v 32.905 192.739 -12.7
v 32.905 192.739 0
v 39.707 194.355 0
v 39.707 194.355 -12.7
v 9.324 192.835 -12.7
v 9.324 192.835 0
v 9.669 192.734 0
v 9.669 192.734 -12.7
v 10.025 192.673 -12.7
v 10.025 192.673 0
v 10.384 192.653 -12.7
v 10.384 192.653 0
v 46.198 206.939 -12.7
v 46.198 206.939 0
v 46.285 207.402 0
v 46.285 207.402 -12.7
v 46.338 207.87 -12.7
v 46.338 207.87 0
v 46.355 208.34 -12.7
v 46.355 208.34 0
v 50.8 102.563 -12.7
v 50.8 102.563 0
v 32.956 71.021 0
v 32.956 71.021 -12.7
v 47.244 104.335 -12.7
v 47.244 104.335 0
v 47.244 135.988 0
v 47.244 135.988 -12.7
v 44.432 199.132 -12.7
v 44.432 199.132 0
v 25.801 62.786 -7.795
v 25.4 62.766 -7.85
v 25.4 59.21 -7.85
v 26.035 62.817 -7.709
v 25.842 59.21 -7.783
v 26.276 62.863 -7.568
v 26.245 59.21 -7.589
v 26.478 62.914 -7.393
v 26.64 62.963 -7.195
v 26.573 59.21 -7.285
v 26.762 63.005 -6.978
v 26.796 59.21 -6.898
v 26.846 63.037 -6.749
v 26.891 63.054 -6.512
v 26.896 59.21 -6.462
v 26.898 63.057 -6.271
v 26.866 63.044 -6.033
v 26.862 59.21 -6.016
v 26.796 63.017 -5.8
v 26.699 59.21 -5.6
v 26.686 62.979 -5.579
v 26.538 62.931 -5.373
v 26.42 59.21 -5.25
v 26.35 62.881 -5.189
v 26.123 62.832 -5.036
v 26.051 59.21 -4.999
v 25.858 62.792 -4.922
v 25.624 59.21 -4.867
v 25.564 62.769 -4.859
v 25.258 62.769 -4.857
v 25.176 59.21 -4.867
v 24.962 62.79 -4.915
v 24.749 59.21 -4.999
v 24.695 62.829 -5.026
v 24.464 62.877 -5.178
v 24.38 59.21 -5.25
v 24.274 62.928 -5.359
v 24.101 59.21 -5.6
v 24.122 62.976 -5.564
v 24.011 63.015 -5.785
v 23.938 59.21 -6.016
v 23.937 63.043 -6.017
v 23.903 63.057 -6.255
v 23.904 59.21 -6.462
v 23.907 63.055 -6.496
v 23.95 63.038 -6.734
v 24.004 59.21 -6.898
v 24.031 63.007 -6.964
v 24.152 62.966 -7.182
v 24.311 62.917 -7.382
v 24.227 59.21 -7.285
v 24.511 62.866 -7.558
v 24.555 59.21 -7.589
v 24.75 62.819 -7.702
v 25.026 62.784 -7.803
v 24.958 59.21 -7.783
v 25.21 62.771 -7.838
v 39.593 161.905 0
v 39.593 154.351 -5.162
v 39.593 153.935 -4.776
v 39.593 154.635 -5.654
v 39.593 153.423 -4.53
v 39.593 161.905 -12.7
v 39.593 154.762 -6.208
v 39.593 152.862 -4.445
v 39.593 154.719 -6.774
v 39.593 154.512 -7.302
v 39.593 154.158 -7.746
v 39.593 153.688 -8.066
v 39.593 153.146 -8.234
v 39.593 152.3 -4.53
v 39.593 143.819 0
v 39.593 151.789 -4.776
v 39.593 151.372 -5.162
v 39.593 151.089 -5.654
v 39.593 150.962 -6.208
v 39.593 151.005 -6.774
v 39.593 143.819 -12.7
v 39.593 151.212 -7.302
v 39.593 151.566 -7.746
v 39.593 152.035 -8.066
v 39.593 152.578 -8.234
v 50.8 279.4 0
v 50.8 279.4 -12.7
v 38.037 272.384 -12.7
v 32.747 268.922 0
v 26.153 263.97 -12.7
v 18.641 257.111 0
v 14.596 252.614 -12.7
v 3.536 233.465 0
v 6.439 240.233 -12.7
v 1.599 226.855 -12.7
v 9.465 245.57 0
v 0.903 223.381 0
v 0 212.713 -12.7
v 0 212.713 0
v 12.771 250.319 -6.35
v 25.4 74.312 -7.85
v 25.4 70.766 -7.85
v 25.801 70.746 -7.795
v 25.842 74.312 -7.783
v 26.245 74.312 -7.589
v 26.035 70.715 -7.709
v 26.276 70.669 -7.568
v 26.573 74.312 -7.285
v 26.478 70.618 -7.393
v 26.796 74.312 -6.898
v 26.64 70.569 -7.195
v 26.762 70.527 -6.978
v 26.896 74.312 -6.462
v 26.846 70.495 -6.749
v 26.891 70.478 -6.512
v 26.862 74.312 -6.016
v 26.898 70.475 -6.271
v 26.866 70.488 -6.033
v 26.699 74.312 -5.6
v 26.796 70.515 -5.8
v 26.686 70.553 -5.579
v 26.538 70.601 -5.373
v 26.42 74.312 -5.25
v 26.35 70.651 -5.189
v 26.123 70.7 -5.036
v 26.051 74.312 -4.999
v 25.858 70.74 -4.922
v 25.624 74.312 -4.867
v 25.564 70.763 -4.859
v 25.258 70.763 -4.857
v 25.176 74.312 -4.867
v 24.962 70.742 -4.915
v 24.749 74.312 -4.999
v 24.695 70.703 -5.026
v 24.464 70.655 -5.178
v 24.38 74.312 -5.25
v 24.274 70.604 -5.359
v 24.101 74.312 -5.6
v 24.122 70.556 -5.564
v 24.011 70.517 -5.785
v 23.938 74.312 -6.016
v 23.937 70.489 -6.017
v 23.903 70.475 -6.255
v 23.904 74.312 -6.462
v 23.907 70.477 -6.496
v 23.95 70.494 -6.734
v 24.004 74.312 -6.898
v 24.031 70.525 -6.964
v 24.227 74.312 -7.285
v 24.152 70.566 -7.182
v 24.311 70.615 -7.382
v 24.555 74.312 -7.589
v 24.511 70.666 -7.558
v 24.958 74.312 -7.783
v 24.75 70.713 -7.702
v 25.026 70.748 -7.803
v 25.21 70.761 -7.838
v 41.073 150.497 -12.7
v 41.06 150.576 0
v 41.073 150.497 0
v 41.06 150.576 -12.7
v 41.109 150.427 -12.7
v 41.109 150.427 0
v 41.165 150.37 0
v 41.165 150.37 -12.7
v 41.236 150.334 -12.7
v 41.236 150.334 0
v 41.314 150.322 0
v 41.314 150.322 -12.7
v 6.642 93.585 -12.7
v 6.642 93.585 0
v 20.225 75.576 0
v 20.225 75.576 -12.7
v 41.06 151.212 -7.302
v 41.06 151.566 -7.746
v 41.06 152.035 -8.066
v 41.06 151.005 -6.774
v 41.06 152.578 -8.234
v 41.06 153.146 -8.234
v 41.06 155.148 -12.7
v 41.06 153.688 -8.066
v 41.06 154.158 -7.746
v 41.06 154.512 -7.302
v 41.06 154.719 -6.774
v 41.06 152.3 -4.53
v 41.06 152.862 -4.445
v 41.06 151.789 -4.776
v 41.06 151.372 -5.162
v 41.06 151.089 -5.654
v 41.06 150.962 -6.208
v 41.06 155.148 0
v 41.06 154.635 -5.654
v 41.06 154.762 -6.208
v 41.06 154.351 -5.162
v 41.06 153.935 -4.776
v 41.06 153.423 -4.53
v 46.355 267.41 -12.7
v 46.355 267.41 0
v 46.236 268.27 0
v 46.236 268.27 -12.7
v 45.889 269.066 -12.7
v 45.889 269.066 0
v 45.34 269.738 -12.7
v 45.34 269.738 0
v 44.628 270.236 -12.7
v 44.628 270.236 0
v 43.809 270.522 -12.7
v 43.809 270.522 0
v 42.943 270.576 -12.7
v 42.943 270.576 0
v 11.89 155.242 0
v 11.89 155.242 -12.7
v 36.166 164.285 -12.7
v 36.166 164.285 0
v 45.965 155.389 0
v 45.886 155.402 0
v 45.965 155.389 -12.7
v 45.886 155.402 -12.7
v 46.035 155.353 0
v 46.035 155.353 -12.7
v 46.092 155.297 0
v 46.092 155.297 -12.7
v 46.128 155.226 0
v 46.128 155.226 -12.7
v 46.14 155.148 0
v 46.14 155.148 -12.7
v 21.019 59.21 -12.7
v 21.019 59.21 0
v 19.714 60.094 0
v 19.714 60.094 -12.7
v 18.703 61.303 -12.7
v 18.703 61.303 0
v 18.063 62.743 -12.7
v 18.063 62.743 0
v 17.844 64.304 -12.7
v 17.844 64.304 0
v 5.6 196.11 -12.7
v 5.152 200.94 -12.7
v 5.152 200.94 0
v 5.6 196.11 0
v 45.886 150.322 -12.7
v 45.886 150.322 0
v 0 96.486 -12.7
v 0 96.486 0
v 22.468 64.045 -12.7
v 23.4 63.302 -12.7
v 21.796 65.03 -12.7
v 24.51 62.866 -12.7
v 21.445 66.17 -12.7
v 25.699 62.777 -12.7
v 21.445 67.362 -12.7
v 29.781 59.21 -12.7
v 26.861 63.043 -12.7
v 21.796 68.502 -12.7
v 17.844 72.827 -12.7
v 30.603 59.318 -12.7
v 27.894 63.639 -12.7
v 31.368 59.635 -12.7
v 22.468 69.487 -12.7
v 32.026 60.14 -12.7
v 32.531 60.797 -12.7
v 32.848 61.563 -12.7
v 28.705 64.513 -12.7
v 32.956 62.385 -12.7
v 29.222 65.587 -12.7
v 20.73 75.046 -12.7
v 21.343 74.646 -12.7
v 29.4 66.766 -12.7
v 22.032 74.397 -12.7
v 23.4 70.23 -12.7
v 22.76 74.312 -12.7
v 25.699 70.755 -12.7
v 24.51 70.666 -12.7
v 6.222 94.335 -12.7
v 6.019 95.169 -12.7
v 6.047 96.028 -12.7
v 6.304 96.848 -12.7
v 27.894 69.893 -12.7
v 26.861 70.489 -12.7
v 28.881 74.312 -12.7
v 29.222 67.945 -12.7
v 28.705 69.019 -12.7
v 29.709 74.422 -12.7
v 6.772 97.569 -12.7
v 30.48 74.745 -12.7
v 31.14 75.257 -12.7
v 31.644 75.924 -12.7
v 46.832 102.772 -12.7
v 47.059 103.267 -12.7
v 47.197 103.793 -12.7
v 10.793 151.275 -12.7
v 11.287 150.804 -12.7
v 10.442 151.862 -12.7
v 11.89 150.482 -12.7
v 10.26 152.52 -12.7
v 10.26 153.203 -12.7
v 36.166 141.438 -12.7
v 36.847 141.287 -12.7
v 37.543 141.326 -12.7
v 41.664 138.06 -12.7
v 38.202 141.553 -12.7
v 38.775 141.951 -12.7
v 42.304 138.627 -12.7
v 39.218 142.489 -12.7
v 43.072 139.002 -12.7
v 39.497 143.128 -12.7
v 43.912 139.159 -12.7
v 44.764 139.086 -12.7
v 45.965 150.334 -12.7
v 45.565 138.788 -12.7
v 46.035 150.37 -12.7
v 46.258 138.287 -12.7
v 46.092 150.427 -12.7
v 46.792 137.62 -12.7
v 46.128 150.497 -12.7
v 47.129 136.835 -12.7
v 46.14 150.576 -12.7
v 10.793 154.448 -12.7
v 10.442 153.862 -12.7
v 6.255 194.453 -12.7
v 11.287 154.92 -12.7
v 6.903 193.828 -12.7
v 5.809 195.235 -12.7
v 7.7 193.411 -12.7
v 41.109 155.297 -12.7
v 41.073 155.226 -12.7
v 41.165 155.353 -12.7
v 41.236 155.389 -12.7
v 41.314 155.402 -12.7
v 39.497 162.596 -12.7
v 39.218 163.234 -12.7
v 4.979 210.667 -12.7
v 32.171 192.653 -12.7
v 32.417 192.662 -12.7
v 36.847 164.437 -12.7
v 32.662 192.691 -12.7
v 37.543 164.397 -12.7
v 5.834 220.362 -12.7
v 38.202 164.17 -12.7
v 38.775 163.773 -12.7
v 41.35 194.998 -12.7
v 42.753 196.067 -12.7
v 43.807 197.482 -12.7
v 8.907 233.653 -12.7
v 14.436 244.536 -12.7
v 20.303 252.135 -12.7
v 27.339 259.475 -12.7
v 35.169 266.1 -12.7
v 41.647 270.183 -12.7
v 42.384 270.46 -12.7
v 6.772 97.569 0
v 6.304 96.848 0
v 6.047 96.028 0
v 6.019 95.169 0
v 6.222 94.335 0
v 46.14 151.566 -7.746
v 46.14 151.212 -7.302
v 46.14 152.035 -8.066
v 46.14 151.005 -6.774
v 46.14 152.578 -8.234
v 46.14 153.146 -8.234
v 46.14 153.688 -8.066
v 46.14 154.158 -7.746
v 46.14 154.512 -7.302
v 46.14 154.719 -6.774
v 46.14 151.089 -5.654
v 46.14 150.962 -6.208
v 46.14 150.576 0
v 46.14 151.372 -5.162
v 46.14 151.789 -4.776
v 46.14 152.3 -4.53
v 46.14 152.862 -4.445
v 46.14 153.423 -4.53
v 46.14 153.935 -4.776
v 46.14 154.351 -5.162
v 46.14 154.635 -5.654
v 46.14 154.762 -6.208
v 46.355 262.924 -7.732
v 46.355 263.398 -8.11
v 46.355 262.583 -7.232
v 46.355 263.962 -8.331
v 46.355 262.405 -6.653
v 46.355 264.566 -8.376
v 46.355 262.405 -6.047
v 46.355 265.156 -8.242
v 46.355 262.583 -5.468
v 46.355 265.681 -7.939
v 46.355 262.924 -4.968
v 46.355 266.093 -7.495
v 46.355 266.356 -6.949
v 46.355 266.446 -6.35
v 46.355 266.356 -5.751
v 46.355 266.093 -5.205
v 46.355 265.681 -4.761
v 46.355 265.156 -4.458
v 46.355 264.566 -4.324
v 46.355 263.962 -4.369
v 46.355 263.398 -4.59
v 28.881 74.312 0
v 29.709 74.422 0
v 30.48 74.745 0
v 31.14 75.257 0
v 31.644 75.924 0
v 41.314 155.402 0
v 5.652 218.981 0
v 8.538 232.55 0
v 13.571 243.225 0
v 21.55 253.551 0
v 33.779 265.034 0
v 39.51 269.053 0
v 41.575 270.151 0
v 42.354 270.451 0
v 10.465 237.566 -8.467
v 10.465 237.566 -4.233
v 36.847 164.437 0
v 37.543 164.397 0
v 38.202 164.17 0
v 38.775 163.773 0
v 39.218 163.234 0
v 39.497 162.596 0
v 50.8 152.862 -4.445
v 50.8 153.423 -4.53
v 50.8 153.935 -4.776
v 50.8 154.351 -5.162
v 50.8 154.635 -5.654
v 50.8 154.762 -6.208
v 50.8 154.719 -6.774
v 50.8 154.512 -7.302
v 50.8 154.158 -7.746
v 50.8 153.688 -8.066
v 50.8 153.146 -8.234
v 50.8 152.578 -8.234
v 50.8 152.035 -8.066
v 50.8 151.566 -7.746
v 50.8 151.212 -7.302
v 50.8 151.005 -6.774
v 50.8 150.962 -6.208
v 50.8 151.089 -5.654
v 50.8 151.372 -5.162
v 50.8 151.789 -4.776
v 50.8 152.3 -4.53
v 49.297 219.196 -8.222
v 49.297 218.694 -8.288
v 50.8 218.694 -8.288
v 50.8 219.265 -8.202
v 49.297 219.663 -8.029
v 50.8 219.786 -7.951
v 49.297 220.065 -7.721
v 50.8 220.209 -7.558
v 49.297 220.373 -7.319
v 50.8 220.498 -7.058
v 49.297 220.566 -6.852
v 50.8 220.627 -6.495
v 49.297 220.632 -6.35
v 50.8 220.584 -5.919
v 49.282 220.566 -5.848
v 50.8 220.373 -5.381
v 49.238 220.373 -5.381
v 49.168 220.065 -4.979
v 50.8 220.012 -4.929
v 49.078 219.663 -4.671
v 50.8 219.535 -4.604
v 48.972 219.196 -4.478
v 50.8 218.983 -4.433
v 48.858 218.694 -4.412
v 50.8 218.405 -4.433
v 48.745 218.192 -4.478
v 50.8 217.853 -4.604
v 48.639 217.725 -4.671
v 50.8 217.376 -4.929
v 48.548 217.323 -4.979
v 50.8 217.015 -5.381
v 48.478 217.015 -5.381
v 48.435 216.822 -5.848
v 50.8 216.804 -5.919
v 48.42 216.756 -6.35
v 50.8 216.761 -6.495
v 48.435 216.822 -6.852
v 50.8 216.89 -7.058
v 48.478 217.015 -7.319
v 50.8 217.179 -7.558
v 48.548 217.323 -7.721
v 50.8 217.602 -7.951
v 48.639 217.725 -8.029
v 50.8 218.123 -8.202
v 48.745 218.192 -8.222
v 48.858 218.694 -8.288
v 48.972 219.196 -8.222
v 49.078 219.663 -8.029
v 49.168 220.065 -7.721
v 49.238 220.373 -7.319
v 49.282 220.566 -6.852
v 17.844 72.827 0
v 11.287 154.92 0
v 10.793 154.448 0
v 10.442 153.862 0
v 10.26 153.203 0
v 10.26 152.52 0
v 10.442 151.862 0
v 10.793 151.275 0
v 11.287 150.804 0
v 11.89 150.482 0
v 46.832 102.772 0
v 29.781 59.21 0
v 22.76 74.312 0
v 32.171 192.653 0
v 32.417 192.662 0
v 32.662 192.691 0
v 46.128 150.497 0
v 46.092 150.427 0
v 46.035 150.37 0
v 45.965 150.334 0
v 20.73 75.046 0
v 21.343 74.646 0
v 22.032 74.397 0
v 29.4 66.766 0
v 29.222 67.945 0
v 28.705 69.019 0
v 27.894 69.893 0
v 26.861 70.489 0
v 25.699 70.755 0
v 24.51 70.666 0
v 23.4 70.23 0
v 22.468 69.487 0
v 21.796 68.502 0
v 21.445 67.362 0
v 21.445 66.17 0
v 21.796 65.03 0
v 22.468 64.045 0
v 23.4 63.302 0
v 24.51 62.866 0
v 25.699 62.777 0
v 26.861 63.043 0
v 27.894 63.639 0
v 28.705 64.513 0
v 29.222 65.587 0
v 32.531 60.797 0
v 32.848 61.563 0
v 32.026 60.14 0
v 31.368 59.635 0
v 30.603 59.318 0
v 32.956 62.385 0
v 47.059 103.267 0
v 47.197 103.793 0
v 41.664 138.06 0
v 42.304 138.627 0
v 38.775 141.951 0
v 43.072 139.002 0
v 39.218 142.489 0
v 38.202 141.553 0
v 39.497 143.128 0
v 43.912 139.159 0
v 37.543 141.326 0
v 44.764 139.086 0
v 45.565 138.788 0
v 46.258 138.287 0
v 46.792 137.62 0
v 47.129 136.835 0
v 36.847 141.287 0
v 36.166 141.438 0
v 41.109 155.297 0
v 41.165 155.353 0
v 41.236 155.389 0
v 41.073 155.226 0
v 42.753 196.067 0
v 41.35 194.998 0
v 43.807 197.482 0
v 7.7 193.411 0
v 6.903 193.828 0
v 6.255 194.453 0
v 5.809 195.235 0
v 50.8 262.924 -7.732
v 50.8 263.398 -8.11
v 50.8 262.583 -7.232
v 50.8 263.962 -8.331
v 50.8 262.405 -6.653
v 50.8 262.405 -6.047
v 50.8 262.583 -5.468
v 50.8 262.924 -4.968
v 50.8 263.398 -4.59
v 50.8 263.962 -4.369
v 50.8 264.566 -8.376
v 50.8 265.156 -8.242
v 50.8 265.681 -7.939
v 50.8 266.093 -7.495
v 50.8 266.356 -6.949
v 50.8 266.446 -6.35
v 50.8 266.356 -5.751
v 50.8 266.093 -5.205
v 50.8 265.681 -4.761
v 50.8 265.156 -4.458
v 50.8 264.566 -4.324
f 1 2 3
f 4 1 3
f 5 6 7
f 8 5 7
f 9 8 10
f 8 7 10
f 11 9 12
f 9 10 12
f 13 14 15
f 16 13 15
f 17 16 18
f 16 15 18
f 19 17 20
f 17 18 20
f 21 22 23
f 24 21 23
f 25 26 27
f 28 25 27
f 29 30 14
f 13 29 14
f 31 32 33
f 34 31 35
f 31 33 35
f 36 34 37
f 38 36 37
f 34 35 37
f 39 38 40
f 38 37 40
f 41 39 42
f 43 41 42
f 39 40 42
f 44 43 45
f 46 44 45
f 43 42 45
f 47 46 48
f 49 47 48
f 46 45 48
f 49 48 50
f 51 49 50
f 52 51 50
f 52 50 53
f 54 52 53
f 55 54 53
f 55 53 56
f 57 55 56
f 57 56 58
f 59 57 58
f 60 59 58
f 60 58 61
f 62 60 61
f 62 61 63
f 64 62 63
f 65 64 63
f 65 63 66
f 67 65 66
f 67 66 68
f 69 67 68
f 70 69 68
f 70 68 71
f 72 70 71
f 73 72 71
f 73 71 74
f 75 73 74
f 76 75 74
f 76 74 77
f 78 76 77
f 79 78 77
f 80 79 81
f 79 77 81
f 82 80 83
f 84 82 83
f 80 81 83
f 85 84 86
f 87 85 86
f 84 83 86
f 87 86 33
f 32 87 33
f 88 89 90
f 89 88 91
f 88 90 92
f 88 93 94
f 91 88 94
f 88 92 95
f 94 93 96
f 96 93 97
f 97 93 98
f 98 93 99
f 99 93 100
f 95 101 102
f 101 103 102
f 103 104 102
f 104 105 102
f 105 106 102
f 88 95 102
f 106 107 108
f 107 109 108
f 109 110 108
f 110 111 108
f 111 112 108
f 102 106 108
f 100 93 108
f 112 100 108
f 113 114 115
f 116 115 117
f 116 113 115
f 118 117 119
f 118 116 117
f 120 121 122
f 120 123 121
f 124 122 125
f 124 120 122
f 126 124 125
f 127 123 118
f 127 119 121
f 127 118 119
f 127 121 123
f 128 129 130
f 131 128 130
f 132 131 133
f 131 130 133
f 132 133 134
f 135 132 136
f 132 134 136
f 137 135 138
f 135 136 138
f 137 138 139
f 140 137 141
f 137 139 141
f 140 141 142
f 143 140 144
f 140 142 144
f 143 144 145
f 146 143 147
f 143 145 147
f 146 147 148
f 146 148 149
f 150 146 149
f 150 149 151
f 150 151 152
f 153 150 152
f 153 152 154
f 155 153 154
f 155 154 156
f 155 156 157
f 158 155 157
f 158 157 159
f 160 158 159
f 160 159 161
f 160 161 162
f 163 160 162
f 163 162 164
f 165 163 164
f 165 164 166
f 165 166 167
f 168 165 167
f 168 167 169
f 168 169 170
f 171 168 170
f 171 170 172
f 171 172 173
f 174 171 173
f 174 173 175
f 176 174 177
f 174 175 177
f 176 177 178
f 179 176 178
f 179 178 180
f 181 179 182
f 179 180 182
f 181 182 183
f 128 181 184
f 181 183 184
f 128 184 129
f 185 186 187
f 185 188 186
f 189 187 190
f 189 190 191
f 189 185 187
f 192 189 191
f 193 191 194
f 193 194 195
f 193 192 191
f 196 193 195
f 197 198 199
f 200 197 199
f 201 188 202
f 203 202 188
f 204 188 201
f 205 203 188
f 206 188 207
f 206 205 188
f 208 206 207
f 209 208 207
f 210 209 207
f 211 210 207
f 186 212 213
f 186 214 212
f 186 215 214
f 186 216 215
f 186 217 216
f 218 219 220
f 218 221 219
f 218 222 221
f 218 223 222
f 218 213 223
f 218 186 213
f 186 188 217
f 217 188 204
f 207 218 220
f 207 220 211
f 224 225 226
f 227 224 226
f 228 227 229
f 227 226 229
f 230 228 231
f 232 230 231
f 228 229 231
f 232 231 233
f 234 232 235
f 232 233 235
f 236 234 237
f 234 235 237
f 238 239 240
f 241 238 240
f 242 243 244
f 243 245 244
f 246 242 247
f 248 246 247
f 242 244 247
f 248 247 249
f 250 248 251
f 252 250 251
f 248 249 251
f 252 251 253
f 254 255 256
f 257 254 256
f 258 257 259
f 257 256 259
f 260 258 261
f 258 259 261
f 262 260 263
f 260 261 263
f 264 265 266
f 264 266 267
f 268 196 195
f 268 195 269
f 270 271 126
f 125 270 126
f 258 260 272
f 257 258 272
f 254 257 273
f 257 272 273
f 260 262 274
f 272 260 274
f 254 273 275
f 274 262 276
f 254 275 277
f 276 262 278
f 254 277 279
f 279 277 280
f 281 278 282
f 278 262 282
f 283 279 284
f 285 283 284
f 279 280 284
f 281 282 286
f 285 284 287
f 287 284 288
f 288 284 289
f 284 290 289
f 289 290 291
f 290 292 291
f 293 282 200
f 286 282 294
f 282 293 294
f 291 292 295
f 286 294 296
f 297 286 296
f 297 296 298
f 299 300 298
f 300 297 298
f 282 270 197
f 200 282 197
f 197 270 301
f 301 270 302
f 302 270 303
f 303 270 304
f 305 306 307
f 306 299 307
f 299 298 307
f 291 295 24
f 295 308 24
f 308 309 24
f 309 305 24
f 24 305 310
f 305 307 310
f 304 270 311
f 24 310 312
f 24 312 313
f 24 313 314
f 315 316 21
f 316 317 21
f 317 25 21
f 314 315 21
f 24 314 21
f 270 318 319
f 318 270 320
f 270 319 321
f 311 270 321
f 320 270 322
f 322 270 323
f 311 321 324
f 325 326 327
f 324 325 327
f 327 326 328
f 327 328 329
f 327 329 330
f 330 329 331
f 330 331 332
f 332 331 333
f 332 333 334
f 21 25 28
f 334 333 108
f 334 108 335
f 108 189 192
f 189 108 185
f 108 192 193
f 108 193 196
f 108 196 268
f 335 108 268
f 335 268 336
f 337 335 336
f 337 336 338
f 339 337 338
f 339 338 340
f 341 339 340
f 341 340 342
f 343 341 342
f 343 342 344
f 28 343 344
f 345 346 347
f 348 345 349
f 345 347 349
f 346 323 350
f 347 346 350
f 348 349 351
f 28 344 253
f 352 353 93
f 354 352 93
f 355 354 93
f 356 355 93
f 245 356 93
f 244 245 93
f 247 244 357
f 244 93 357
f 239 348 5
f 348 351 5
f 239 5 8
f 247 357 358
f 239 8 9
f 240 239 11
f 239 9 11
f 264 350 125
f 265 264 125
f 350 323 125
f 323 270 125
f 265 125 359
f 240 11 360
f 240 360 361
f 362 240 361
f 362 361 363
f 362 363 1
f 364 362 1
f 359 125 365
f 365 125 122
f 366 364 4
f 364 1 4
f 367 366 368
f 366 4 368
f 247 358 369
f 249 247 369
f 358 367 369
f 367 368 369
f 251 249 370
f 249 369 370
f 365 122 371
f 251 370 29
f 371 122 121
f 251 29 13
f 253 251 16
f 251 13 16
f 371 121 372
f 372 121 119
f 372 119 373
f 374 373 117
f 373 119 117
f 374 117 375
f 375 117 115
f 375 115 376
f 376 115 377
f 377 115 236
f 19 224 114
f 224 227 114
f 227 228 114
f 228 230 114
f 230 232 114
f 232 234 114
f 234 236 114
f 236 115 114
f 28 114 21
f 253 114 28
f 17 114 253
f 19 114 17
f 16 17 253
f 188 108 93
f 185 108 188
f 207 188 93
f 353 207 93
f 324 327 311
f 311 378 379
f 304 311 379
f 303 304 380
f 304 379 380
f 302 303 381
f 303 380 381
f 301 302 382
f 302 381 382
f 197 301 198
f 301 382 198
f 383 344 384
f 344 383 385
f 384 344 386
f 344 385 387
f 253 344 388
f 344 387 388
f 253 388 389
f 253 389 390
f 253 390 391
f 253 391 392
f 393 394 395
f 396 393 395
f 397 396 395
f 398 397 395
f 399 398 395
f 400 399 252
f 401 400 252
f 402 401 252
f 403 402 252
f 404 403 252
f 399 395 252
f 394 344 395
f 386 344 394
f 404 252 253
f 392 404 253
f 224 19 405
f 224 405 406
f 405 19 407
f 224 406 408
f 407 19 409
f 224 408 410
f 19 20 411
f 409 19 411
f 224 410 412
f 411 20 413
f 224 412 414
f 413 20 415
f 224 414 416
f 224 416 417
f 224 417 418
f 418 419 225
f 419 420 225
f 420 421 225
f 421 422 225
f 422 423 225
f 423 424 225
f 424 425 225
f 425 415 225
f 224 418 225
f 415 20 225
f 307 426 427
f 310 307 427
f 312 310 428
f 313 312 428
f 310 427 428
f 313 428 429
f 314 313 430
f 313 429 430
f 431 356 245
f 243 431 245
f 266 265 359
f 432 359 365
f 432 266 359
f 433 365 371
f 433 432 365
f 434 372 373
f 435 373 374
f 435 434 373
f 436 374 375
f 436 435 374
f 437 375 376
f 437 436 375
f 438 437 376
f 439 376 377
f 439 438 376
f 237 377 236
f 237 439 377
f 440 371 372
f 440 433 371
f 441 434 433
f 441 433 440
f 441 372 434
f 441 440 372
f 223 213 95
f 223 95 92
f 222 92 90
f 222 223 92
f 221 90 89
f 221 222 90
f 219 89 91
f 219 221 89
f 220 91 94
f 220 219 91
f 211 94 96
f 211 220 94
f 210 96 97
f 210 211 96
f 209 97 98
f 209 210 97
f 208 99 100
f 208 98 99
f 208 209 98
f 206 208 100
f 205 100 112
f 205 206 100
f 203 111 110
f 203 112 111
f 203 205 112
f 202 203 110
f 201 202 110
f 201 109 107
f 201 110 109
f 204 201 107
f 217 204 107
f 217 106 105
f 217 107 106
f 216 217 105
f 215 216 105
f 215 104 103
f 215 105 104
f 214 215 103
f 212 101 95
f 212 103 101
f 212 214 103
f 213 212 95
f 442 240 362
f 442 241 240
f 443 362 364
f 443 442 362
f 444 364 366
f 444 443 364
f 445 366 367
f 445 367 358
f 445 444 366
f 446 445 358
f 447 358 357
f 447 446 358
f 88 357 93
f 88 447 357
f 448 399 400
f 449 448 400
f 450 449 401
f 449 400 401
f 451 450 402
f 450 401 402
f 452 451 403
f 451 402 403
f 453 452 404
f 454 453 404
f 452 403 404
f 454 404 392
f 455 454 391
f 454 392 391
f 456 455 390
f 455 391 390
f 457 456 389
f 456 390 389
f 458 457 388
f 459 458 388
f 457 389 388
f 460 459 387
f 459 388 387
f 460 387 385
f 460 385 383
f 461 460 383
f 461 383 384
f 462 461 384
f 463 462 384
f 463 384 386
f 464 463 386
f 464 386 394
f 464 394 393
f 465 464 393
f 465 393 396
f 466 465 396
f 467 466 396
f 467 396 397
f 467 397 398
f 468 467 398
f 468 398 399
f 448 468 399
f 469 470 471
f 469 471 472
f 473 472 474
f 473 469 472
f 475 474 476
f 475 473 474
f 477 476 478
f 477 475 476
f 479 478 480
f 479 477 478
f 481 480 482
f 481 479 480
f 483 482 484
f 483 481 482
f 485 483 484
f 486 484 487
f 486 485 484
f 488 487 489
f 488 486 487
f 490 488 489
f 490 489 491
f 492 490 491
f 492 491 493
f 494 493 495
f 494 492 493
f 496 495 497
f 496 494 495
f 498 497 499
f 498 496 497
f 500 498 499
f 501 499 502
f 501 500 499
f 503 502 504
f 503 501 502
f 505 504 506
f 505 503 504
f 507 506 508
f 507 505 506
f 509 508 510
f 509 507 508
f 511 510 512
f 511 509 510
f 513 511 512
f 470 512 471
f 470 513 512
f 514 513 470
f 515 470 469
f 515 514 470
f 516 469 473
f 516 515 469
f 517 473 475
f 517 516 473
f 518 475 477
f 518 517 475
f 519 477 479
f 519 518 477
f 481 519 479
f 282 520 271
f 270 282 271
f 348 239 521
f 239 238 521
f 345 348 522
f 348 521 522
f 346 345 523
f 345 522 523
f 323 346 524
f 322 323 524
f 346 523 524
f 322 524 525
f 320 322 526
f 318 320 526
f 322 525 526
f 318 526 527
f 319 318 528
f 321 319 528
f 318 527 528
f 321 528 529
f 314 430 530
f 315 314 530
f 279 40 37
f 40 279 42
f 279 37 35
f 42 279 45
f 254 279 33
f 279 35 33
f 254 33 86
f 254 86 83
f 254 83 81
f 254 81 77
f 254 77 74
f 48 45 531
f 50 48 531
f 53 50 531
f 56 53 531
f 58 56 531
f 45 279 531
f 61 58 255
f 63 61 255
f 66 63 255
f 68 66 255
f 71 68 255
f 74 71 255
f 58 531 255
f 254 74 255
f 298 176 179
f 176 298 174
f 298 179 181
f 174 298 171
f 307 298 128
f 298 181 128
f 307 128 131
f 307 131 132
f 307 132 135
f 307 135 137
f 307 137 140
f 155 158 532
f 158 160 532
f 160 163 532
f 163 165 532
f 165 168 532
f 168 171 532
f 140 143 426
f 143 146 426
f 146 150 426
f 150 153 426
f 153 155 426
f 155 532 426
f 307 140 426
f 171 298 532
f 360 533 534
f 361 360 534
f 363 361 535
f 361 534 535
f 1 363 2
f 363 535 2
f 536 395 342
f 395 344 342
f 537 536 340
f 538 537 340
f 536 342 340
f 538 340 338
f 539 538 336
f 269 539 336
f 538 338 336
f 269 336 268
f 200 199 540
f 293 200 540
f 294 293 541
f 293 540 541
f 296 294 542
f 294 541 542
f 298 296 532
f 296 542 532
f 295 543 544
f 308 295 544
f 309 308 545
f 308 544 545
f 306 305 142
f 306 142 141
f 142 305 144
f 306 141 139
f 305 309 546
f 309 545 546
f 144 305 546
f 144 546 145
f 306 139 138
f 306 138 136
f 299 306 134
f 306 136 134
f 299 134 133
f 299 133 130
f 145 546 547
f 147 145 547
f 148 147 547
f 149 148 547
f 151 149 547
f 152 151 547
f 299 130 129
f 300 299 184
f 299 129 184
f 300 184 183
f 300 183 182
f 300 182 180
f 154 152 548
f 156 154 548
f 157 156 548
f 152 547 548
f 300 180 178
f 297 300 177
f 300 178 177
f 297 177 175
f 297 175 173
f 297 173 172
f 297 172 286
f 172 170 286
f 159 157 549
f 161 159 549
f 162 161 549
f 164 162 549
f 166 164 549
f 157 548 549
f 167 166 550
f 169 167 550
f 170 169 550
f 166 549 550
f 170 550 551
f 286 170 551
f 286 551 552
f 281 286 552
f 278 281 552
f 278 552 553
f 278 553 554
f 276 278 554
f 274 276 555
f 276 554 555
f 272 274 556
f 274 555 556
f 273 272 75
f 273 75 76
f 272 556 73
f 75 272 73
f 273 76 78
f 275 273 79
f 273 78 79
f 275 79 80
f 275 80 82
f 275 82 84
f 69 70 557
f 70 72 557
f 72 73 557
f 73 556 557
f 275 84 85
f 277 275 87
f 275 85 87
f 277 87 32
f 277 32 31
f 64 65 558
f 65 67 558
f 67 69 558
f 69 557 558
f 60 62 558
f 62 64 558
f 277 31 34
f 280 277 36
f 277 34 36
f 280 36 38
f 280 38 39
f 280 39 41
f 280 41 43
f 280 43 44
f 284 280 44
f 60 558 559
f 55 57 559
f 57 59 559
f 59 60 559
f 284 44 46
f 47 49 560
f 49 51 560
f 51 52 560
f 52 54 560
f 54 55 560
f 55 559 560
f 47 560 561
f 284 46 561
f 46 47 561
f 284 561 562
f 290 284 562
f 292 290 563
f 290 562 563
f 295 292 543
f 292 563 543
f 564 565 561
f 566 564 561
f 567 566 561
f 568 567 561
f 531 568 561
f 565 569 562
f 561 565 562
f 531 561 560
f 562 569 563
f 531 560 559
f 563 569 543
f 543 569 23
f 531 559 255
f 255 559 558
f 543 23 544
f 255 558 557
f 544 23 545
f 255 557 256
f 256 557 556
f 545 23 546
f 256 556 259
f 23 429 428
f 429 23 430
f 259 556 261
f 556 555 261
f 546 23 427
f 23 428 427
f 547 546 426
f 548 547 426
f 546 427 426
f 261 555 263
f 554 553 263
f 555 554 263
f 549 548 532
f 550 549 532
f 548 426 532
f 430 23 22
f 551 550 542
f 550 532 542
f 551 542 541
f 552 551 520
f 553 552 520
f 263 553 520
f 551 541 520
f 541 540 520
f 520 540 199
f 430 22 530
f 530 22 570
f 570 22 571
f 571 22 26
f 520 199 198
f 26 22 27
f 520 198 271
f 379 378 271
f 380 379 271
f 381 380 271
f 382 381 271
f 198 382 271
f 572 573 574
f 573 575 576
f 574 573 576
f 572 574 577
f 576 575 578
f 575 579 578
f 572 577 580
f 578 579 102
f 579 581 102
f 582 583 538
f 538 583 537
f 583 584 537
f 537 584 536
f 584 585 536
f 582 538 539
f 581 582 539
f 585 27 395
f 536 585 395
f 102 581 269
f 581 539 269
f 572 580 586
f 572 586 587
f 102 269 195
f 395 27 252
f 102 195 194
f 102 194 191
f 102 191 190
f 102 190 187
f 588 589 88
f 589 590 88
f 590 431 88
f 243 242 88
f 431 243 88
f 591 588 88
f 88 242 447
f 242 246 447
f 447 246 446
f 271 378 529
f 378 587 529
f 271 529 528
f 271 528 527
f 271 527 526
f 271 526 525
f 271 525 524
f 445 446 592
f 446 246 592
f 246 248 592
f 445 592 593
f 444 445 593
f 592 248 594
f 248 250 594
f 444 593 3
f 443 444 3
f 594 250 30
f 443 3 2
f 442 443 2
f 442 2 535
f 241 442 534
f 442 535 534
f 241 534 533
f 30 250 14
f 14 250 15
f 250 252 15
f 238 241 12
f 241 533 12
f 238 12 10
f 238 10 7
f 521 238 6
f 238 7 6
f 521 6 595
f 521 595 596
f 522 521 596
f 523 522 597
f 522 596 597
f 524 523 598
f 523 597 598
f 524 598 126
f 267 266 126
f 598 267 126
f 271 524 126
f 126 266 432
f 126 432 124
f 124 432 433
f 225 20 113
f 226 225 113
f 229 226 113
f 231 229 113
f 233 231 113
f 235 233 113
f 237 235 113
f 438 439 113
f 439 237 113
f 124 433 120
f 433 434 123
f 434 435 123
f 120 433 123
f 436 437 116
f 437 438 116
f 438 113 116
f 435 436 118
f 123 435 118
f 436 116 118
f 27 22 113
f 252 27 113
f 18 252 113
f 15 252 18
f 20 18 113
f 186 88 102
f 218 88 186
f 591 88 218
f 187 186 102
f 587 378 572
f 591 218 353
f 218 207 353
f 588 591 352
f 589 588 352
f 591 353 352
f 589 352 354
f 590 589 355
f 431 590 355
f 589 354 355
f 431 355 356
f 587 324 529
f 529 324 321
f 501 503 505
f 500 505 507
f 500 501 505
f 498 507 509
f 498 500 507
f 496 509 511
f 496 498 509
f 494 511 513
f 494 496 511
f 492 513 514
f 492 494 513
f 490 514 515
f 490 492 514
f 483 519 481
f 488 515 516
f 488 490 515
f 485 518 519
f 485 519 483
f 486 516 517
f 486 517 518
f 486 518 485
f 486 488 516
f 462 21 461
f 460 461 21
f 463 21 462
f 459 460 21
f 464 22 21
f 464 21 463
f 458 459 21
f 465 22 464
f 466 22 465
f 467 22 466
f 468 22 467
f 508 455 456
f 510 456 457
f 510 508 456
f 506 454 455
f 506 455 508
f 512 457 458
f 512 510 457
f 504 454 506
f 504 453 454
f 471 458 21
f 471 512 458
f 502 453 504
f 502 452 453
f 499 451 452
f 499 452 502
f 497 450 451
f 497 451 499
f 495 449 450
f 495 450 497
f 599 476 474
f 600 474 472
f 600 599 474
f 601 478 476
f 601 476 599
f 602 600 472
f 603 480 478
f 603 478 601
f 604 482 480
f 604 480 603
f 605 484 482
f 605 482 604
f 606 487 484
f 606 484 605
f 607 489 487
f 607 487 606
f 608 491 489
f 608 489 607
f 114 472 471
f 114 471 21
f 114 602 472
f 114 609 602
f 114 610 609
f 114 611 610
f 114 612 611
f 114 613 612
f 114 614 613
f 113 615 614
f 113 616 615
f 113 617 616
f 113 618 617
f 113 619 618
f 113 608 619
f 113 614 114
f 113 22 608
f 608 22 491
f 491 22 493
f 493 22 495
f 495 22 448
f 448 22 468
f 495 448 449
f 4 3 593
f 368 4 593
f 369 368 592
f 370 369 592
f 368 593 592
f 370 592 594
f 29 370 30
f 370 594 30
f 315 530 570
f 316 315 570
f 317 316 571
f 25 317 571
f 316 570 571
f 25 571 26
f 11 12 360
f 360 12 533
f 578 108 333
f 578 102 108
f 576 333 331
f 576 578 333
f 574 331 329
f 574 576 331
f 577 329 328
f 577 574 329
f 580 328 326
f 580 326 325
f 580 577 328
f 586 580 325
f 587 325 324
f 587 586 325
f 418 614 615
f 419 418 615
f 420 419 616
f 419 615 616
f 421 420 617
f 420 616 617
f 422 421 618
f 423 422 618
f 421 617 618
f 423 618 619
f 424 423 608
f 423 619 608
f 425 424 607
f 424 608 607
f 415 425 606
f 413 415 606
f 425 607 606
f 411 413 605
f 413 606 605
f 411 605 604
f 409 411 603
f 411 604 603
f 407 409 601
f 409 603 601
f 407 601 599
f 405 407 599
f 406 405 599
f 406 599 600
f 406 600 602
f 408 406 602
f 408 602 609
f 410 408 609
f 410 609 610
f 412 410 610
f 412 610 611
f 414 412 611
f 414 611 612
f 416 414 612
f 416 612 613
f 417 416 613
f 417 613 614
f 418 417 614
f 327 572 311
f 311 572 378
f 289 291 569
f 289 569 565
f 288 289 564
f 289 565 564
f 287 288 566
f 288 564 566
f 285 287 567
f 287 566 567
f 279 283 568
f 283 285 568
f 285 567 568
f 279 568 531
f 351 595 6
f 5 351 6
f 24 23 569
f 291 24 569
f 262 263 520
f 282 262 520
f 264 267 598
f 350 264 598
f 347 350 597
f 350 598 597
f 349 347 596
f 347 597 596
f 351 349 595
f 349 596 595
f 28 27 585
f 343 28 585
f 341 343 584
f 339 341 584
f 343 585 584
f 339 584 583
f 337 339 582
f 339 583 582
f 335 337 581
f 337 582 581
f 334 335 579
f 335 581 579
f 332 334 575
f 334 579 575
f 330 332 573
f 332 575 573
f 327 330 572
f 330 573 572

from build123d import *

# Parameters (mm, degrees)
SKETCH1_W                       = 50.8
SKETCH1_H                       = 279.4
BOSS_EXTRUDE1_DEPTH             = 12.7
SKETCH4_R                       = 3.175
CUT_EXTRUDE9_DEPTH              = 285.264471927
SKETCH12_R                      = 2.032
CUT_EXTRUDE7_DEPTH              = 10.16
SKETCH13_R                      = 3.999992
CUT_EXTRUDE8_DEPTH              = 285.264471927
CUT_EXTRUDE10_DEPTH             = 285.264471927
CUT_EXTRUDE11_START             = -1.503205808
CUT_EXTRUDE11_OUTLINE_R         = 1.938274984
CUT_EXTRUDE11_DEPTH             = 1.503205808
CUT_EXTRUDE11_START_2           = 48.41965954
CUT_EXTRUDE11_2_OUTLINE_R       = 1.938274984
CUT_EXTRUDE11_2_DEPTH           = 0.877134652
CUT_EXTRUDE11_START_3           = -2
CUT_EXTRUDE11_3_OUTLINE_W       = 7
CUT_EXTRUDE11_3_OUTLINE_H       = 7
CUT_EXTRUDE11_3_DEPTH           = 1.390444415
CUT_EXTRUDE12_REACH             = 228.331
SKETCH25_R                      = 1.499997
SKETCH27_R                      = 3.175
BOSS_EXTRUDE2_DEPTH             = 12.7
BOSS_EXTRUDE3_DEPTH             = 12.7
CUT_EXTRUDE13_REACH             = 286.264
SKETCH30_W                      = 5.08
SKETCH30_H                      = 5.08
FILLET1_R                       = 0.254
BOSS_EXTRUDE4_DEPTH             = 12.7
BOSS_EXTRUDE6_DEPTH             = 12.7
CUT_EXTRUDE16_DEPTH             = 12.7
FILLET2_R                       = 2.54
CUT_EXTRUDE15_REACH             = 285.469
SKETCH33_R                      = 1.905
CUT_EXTRUDE15_DIRECTION_2_REACH = 285.469


with BuildPart() as part:
    # Sketch1 → Boss-Extrude1 (new body)
    with BuildSketch(Plane.XY):
        with Locations((25.4, 139.7)):
            Rectangle(SKETCH1_W, SKETCH1_H)
    extrude(amount=-BOSS_EXTRUDE1_DEPTH)

    # Sketch4 → Cut-Extrude9 (cut, through all)
    with BuildSketch(Plane.XY):
        with Locations((23.83643591, 185.629212401)):
            Circle(SKETCH4_R)
    extrude(amount=-CUT_EXTRUDE9_DEPTH, mode=Mode.SUBTRACT)

    # Sketch12 → Cut-Extrude7 (cut)
    with BuildSketch(Plane(origin=(50.8, 0, 0), x_dir=(0, 0, -1), z_dir=(1, 0, 0))):
        with Locations(Location((6.35, 264.414, 0), (0, 0, 90))):
            Circle(SKETCH12_R)
    extrude(amount=-CUT_EXTRUDE7_DEPTH, mode=Mode.SUBTRACT)

    # Sketch13 → Cut-Extrude8 (cut, through all)
    with BuildSketch(Plane.XY):
        with Locations((25.4, 66.765991822)):
            Circle(SKETCH13_R)
    extrude(amount=-CUT_EXTRUDE8_DEPTH, mode=Mode.SUBTRACT)

    # Sketch23 → Cut-Extrude10 (cut, through all)
    with BuildSketch(Plane.XY):
        with BuildLine():
            ThreePointArc((9.684585518, 189.97530689), (6.134029107, 191.135611391), (3.936744482, 188.114899944))
            Line((3.936744482, 188.114899944), (3.936744482, 146.137041934))
            ThreePointArc((3.936744482, 146.137041934), (5.718074121, 143.284269963), (9.063237662, 143.632586032))
            Line((9.063237662, 143.632586032), (28.478072635, 158.76078933))
            ThreePointArc((28.478072635, 158.76078933), (29.669890916, 160.817787912), (29.09942049, 163.125652178))
            Line((29.09942049, 163.125652178), (9.684585518, 189.97530689))
        make_face()
        with BuildLine():
            ThreePointArc((25.454329065, 180.059457716), (24.214328296, 177.76665467), (24.841195831, 175.236519336))
            Line((24.841195831, 175.236519336), (41.277424699, 151.829201394))
            ThreePointArc((41.277424699, 151.829201394), (44.832564118, 150.626331551), (47.050818, 153.653749901))
            Line((47.050818, 153.653749901), (47.050818, 185.147561676))
            ThreePointArc((47.050818, 185.147561676), (46.630207739, 186.726790021), (45.479818209, 187.887599691))
            Line((45.479818209, 187.887599691), (44.197770493, 188.638101981))
            ThreePointArc((44.197770493, 188.638101981), (43.361590273, 188.9788232), (42.463311258, 189.070382588))
            Line((42.463311258, 189.070382588), (36.797920165, 188.837397982))
            ThreePointArc((36.797920165, 188.837397982), (35.770181972, 188.621293865), (34.869165079, 188.081742811))
            Line((34.869165079, 188.081742811), (25.454329065, 180.059457716))
        make_face()
        with BuildLine():
            Line((17.844008, 72.826525287), (0, 96.485678179))
            Line((0, 96.485678179), (0, 0))
            Line((0, 0), (50.8, 0))
            Line((50.8, 0), (50.8, 102.563019115))
            Line((50.8, 102.563019115), (32.955992, 71.020999822))
            Line((32.955992, 71.020999822), (32.955992, 62.384999822))
            ThreePointArc((32.955992, 62.384999822), (32.02605603, 60.139935792), (29.780992, 59.209999822))
            Line((29.780992, 59.209999822), (21.019008, 59.209999822))
            ThreePointArc((21.019008, 59.209999822), (18.702744933, 61.302679759), (17.844008, 64.303838667))
            Line((17.844008, 64.303838667), (17.844008, 72.826525287))
        make_face()
        with BuildLine():
            Line((0, 279.4), (0, 212.713248228))
            add(Edge.make_bspline(
                [(50.8, 279.4), (0.142999661, 254.58086249), (0, 212.713248228)],
                knots=[0, 0, 0, 0.994370092, 0.994370092, 0.994370092], degree=2))
            Line((50.8, 279.4), (0, 279.4))
        make_face()
        with BuildLine():
            Line((41.663820171, 138.060133531), (6.771583692, 97.569215865))
            ThreePointArc((6.771583692, 97.569215865), (6.003443965, 95.599886341), (6.641897139, 93.584774692))
            Line((6.641897139, 93.584774692), (20.224698456, 75.575503845))
            ThreePointArc((20.224698456, 75.575503845), (21.343482484, 74.645615997), (22.759564839, 74.312329523))
            Line((22.759564839, 74.312329523), (28.880684896, 74.312329523))
            ThreePointArc((28.880684896, 74.312329523), (30.480220228, 74.744682677), (31.644124603, 75.923991431))
            Line((31.644124603, 75.923991431), (46.832439707, 102.771666463))
            ThreePointArc((46.832439707, 102.771666463), (47.139386463, 103.526702652), (47.244, 104.335004554))
            Line((47.244, 104.335004554), (47.244, 135.987518036))
            ThreePointArc((47.244, 135.987518036), (45.174481579, 138.963847231), (41.663820171, 138.060133531))
        make_face()
        with BuildLine():
            Line((46.355, 208.340265374), (46.355, 267.410375004))
            ThreePointArc((46.355, 267.410375004), (45.339538097, 269.737824297), (42.942703805, 270.57649495))
            add(Edge.make_bspline(
                [(5.151800286, 200.939735337), (4.443406818, 208.580073659), (5.142632502, 230.03866236), (23.019678506, 258.304051629), (39.986259259, 270.354913629), (42.942703805, 270.57649495)],
                knots=[0.110917616, 0.110917616, 0.110917616, 0.110917616, 0.428445761, 0.512326632, 0.949726322, 0.949726322, 0.949726322, 0.949726322], degree=3))
            Line((5.151800286, 200.939735337), (5.599599739, 196.110019261))
            ThreePointArc((5.599599739, 196.110019261), (6.255400613, 194.453166983), (7.7004375, 193.410524834))
            Line((7.7004375, 193.410524834), (9.323596038, 192.835266777))
            ThreePointArc((9.323596038, 192.835266777), (9.8461136, 192.698810545), (10.384198625, 192.652882214))
            Line((10.384198625, 192.652882214), (32.17055899, 192.652882214))
            ThreePointArc((32.17055899, 192.652882214), (32.540085896, 192.674459492), (32.904590198, 192.738898047))
            Line((32.904590198, 192.738898047), (39.706586273, 194.355247347))
            ThreePointArc((39.706586273, 194.355247347), (42.752792223, 196.067358416), (44.431961055, 199.131846471))
            Line((44.431961055, 199.131846471), (46.198437199, 206.938896164))
            ThreePointArc((46.198437199, 206.938896164), (46.315737921, 207.635221479), (46.355, 208.340265374))
        make_face()
        with BuildLine():
            Line((29.980948296, 155.351785669), (4.812598642, 135.740395164))
            ThreePointArc((4.812598642, 135.740395164), (3.886943233, 134.599566539), (3.556, 133.168201993))
            Line((3.556, 133.168201993), (3.556, 110.456761818))
            ThreePointArc((3.556, 110.456761818), (5.634129033, 107.41794452), (9.219765375, 108.252356215))
            Line((9.219765375, 108.252356215), (40.635310398, 142.496582814))
            ThreePointArc((40.635310398, 142.496582814), (41.467985487, 144.51174404), (40.804546499, 146.588778291))
            Line((40.804546499, 146.588778291), (34.441290858, 154.793171429))
            ThreePointArc((34.441290858, 154.793171429), (32.32699686, 155.997718798), (29.980948296, 155.351785669))
        make_face()
    extrude(amount=-CUT_EXTRUDE10_DEPTH, mode=Mode.SUBTRACT)

    # Cut-Extrude11: read off the stored shape, not the designer's step
    # Cut-Extrude11 outline → Cut-Extrude11 (cut)
    with BuildSketch(Plane(origin=(50.8, 0, 0), x_dir=(0, 0, -1), z_dir=(1, 0, 0)).offset(CUT_EXTRUDE11_START)):
        with Locations((6.35, 218.694)):
            Circle(CUT_EXTRUDE11_OUTLINE_R)
    extrude(amount=CUT_EXTRUDE11_DEPTH, mode=Mode.SUBTRACT)

    # Cut-Extrude11 2 outline → Cut-Extrude11 2 (cut)
    with BuildSketch(Plane.YZ.offset(CUT_EXTRUDE11_START_2)):
        with Locations((218.694, -6.35)):
            Circle(CUT_EXTRUDE11_2_OUTLINE_R)
    extrude(amount=CUT_EXTRUDE11_2_DEPTH, mode=Mode.SUBTRACT)

    # Cut-Extrude11 3 outline → Cut-Extrude11 3 (add)
    with BuildSketch(Plane(origin=(0, 0, 0), x_dir=(0.22068806457460396, 0.9753444407768548, 0), z_dir=(0.9753444407768548, -0.22068806457460394, 0)).offset(CUT_EXTRUDE11_START_3)):
        with Locations((224.5, -6.5)):
            Rectangle(CUT_EXTRUDE11_3_OUTLINE_W, CUT_EXTRUDE11_3_OUTLINE_H)
    extrude(amount=CUT_EXTRUDE11_3_DEPTH)

    # Cut-Extrude12: up to this face of the body (flat: up to its plane)
    cut_extrude12_end = Plane(part.part.faces().sort_by_distance((25.820124867, 74.312329523, -6.35))[0])
    # Sketch25 → Cut-Extrude12 (cut, up to the picked face)
    with BuildSketch(Plane.XZ.offset(-59.209999822), mode=Mode.PRIVATE) as cut_extrude12_sk1:
        with Locations(Location((25.4, -6.35, 0), (0, 0, 270))):
            Circle(SKETCH25_R)
    cut_extrude12_tool1 = split(extrude(cut_extrude12_sk1.sketch, amount=-CUT_EXTRUDE12_REACH, mode=Mode.PRIVATE), bisect_by=cut_extrude12_end, keep=Keep.BOTH, mode=Mode.PRIVATE)
    add(cut_extrude12_tool1.solids().sort_by(Axis((25.4, 59.21, -6.35), (0, 1, 0)))[0], mode=Mode.SUBTRACT)

    # Sketch27 → Boss-Extrude2 (add)
    with BuildSketch(Plane.XY):
        with Locations((23.83643591, 185.629212401)):
            Circle(SKETCH27_R)
    extrude(amount=-BOSS_EXTRUDE2_DEPTH)

    # Sketch23<5> → Boss-Extrude3 (add)
    with BuildSketch(Plane.XY):
        with BuildLine():
            ThreePointArc((34.869165079, 188.081742811), (35.770181972, 188.621293865), (36.797920165, 188.837397982))
            Line((36.797920165, 188.837397982), (42.463311258, 189.070382588))
            ThreePointArc((42.463311258, 189.070382588), (43.361590273, 188.9788232), (44.197770493, 188.638101981))
            Line((44.197770493, 188.638101981), (45.479818209, 187.887599691))
            ThreePointArc((45.479818209, 187.887599691), (46.630207739, 186.726790021), (47.050818, 185.147561676))
            Line((47.050818, 185.147561676), (47.050818, 153.653749901))
            ThreePointArc((47.050818, 153.653749901), (44.832564118, 150.626331551), (41.277424699, 151.829201394))
            Line((41.277424699, 151.829201394), (24.841195831, 175.236519336))
            ThreePointArc((24.841195831, 175.236519336), (24.214328296, 177.76665467), (25.454329065, 180.059457716))
            Line((25.454329065, 180.059457716), (34.869165079, 188.081742811))
        make_face()
    extrude(amount=-BOSS_EXTRUDE3_DEPTH)

    # Sketch30 → Cut-Extrude13 (cut, up to next)
    with BuildSketch(Plane.XY, mode=Mode.PRIVATE) as cut_extrude13_sk1:
        with Locations((43.600124867, 152.861829523)):
            Rectangle(SKETCH30_W, SKETCH30_H)
    cut_extrude13_tool1 = extrude(cut_extrude13_sk1.sketch, amount=-CUT_EXTRUDE13_REACH, mode=Mode.PRIVATE) & part.part
    add(cut_extrude13_tool1.solids().sort_by_distance((43.600125, 152.86183, 0))[0], mode=Mode.SUBTRACT)

    # Fillet1
    fillet1_edges = [part.edges().sort_by_distance(p)[0] for p in [
        (41.060124867, 150.321829523, -6.35),
        (41.060124867, 155.401829523, -6.35),
        (46.140124867, 155.401829523, -6.35),
        (46.140124867, 150.321829523, -6.35),
    ]]
    fillet(fillet1_edges, radius=FILLET1_R)

    # Sketch23<6> → Boss-Extrude4 (add)
    with BuildSketch(Plane.XY):
        with BuildLine():
            ThreePointArc((29.980948296, 155.351785669), (32.32699686, 155.997718798), (34.441290858, 154.793171429))
            Line((34.441290858, 154.793171429), (40.804546499, 146.588778291))
            ThreePointArc((40.804546499, 146.588778291), (41.467985487, 144.51174404), (40.635310398, 142.496582814))
            Line((40.635310398, 142.496582814), (9.219765375, 108.252356215))
            ThreePointArc((9.219765375, 108.252356215), (5.634129033, 107.41794452), (3.556, 110.456761818))
            Line((3.556, 110.456761818), (3.556, 133.168201993))
            ThreePointArc((3.556, 133.168201993), (3.886943233, 134.599566539), (4.812598642, 135.740395164))
            Line((4.812598642, 135.740395164), (29.980948296, 155.351785669))
        make_face()
    extrude(amount=-BOSS_EXTRUDE4_DEPTH)

    # Sketch23<7> → Boss-Extrude6 (add)
    with BuildSketch(Plane.XY):
        with BuildLine():
            ThreePointArc((3.936744482, 188.114899944), (6.134029107, 191.135611391), (9.684585518, 189.97530689))
            Line((9.684585518, 189.97530689), (29.09942049, 163.125652178))
            ThreePointArc((29.09942049, 163.125652178), (29.669890916, 160.817787912), (28.478072635, 158.76078933))
            Line((28.478072635, 158.76078933), (9.063237662, 143.632586032))
            ThreePointArc((9.063237662, 143.632586032), (5.718074121, 143.284269963), (3.936744482, 146.137041934))
            Line((3.936744482, 146.137041934), (3.936744482, 188.114899944))
        make_face()
    extrude(amount=-BOSS_EXTRUDE6_DEPTH)

    # Sketch37 → Cut-Extrude16 (cut)
    with BuildSketch(Plane(origin=(0, 0, -12.7), x_dir=(-1, 0, 0), z_dir=(0, 0, -1))):
        Polygon((-5.500124867, 152.861829523), (-39.593154467, 165.561829523), (-39.593154467, 140.161829523), align=None)
    extrude(amount=-CUT_EXTRUDE16_DEPTH, mode=Mode.SUBTRACT)

    # Fillet2
    fillet2_edges = [part.edges().sort_by_distance(p)[0] for p in [
        (5.500124867, 152.861829523, -6.35),
        (39.593154467, 140.161829523, -6.35),
        (39.593154467, 165.561829523, -6.35),
    ]]
    fillet(fillet2_edges, radius=FILLET2_R)

    # Cut-Extrude15: up to this face of the body (flat: up to its plane)
    cut_extrude15_end = Plane(part.part.faces().sort_by_distance((50.8, 190.405374974, -6.35))[0])
    # Sketch33 → Cut-Extrude15 (cut, up to the picked face)
    with BuildSketch(Plane.ZY.offset(-46.140124867), mode=Mode.PRIVATE) as cut_extrude15_sk1:
        with Locations((-6.35, 152.861829523)):
            Circle(SKETCH33_R)
    cut_extrude15_tool1 = split(extrude(cut_extrude15_sk1.sketch, amount=-CUT_EXTRUDE15_REACH, mode=Mode.PRIVATE), bisect_by=cut_extrude15_end, keep=Keep.BOTH, mode=Mode.PRIVATE)
    add(cut_extrude15_tool1.solids().sort_by(Axis((46.140125, 152.86183, -6.35), (1, 0, 0)))[0], mode=Mode.SUBTRACT)

    # Cut-Extrude15 direction 2: up to this face of the body (flat: up to its plane)
    cut_extrude15_direction_2_end = Plane(part.part.faces().sort_by_distance((39.593154467, 152.861829523, -6.35))[0])
    # Sketch33 → Cut-Extrude15 direction 2 (cut, up to the picked face)
    with BuildSketch(Plane.ZY.offset(-46.140124867), mode=Mode.PRIVATE) as cut_extrude15_direction_2_sk1:
        with Locations((-6.35, 152.861829523)):
            Circle(SKETCH33_R)
    cut_extrude15_direction_2_tool1 = split(extrude(cut_extrude15_direction_2_sk1.sketch, amount=CUT_EXTRUDE15_DIRECTION_2_REACH, mode=Mode.PRIVATE), bisect_by=cut_extrude15_direction_2_end, keep=Keep.BOTH, mode=Mode.PRIVATE)
    add(cut_extrude15_direction_2_tool1.solids().sort_by(Axis((46.140125, 152.86183, -6.35), (-1, 0, 0)))[0], mode=Mode.SUBTRACT)


solid = part.part
